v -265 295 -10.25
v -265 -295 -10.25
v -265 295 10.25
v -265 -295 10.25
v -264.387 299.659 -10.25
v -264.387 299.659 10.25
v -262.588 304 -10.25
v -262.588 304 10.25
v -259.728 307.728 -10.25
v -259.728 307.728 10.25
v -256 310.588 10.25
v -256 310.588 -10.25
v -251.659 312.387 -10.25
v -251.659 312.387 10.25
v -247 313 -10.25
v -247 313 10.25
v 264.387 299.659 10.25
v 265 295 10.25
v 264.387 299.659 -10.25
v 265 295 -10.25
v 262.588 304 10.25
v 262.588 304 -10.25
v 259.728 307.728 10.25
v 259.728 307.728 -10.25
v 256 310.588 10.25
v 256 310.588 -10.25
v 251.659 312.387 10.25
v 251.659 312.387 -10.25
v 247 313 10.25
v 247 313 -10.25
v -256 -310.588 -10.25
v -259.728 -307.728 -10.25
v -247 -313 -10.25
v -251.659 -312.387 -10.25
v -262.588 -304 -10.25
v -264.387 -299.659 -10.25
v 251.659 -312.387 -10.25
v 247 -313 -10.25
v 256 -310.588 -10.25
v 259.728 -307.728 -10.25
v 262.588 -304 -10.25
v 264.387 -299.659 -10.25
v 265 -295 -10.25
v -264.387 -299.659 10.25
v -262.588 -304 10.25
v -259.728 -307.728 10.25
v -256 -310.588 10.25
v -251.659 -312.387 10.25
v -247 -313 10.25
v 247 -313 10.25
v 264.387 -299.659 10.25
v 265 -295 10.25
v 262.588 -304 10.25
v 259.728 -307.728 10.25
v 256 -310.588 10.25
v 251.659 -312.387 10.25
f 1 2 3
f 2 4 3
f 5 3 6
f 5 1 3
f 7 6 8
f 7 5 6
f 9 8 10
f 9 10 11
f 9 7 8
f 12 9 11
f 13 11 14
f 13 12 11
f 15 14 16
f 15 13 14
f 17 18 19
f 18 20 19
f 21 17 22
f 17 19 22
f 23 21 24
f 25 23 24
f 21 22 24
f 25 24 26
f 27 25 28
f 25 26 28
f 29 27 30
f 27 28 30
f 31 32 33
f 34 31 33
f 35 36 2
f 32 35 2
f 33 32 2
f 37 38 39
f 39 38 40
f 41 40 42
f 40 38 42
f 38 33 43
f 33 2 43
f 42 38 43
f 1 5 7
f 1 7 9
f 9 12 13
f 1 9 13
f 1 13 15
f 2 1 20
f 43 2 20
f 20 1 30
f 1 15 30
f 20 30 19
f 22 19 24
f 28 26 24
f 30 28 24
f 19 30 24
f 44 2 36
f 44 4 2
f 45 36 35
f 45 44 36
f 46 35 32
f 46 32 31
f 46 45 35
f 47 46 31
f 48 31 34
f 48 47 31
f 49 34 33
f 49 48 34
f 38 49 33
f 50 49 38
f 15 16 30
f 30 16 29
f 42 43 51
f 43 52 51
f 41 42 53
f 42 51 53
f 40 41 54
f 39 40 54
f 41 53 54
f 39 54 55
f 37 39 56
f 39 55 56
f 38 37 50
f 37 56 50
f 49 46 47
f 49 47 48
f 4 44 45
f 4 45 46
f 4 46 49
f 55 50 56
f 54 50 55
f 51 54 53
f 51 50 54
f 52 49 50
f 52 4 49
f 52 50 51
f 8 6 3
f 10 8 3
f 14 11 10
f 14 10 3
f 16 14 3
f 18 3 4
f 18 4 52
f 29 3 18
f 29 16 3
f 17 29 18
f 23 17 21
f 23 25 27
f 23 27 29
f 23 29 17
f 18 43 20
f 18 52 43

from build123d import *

# Parameters (mm, degrees)
SKETCH_1_W      = 530
SKETCH_1_H      = 626
EXTRUDE_1_DEPTH = 10.25
FILLET_1_R      = 18


with BuildPart() as part:
    # Эскиз1 → Бобышка-Вытянуть1 (new, symmetric)
    with BuildSketch(Plane.XY):
        Rectangle(SKETCH_1_W, SKETCH_1_H)
    extrude(amount=EXTRUDE_1_DEPTH, both=True)

    # Скругление1
    fillet_1_edges = [part.edges().sort_by_distance(p)[0] for p in [
        (265, -313, 0),
        (-265, -313, 0),
        (-265, 313, 0),
        (265, 313, 0),
    ]]
    fillet(fillet_1_edges, radius=FILLET_1_R)


solid = part.part
